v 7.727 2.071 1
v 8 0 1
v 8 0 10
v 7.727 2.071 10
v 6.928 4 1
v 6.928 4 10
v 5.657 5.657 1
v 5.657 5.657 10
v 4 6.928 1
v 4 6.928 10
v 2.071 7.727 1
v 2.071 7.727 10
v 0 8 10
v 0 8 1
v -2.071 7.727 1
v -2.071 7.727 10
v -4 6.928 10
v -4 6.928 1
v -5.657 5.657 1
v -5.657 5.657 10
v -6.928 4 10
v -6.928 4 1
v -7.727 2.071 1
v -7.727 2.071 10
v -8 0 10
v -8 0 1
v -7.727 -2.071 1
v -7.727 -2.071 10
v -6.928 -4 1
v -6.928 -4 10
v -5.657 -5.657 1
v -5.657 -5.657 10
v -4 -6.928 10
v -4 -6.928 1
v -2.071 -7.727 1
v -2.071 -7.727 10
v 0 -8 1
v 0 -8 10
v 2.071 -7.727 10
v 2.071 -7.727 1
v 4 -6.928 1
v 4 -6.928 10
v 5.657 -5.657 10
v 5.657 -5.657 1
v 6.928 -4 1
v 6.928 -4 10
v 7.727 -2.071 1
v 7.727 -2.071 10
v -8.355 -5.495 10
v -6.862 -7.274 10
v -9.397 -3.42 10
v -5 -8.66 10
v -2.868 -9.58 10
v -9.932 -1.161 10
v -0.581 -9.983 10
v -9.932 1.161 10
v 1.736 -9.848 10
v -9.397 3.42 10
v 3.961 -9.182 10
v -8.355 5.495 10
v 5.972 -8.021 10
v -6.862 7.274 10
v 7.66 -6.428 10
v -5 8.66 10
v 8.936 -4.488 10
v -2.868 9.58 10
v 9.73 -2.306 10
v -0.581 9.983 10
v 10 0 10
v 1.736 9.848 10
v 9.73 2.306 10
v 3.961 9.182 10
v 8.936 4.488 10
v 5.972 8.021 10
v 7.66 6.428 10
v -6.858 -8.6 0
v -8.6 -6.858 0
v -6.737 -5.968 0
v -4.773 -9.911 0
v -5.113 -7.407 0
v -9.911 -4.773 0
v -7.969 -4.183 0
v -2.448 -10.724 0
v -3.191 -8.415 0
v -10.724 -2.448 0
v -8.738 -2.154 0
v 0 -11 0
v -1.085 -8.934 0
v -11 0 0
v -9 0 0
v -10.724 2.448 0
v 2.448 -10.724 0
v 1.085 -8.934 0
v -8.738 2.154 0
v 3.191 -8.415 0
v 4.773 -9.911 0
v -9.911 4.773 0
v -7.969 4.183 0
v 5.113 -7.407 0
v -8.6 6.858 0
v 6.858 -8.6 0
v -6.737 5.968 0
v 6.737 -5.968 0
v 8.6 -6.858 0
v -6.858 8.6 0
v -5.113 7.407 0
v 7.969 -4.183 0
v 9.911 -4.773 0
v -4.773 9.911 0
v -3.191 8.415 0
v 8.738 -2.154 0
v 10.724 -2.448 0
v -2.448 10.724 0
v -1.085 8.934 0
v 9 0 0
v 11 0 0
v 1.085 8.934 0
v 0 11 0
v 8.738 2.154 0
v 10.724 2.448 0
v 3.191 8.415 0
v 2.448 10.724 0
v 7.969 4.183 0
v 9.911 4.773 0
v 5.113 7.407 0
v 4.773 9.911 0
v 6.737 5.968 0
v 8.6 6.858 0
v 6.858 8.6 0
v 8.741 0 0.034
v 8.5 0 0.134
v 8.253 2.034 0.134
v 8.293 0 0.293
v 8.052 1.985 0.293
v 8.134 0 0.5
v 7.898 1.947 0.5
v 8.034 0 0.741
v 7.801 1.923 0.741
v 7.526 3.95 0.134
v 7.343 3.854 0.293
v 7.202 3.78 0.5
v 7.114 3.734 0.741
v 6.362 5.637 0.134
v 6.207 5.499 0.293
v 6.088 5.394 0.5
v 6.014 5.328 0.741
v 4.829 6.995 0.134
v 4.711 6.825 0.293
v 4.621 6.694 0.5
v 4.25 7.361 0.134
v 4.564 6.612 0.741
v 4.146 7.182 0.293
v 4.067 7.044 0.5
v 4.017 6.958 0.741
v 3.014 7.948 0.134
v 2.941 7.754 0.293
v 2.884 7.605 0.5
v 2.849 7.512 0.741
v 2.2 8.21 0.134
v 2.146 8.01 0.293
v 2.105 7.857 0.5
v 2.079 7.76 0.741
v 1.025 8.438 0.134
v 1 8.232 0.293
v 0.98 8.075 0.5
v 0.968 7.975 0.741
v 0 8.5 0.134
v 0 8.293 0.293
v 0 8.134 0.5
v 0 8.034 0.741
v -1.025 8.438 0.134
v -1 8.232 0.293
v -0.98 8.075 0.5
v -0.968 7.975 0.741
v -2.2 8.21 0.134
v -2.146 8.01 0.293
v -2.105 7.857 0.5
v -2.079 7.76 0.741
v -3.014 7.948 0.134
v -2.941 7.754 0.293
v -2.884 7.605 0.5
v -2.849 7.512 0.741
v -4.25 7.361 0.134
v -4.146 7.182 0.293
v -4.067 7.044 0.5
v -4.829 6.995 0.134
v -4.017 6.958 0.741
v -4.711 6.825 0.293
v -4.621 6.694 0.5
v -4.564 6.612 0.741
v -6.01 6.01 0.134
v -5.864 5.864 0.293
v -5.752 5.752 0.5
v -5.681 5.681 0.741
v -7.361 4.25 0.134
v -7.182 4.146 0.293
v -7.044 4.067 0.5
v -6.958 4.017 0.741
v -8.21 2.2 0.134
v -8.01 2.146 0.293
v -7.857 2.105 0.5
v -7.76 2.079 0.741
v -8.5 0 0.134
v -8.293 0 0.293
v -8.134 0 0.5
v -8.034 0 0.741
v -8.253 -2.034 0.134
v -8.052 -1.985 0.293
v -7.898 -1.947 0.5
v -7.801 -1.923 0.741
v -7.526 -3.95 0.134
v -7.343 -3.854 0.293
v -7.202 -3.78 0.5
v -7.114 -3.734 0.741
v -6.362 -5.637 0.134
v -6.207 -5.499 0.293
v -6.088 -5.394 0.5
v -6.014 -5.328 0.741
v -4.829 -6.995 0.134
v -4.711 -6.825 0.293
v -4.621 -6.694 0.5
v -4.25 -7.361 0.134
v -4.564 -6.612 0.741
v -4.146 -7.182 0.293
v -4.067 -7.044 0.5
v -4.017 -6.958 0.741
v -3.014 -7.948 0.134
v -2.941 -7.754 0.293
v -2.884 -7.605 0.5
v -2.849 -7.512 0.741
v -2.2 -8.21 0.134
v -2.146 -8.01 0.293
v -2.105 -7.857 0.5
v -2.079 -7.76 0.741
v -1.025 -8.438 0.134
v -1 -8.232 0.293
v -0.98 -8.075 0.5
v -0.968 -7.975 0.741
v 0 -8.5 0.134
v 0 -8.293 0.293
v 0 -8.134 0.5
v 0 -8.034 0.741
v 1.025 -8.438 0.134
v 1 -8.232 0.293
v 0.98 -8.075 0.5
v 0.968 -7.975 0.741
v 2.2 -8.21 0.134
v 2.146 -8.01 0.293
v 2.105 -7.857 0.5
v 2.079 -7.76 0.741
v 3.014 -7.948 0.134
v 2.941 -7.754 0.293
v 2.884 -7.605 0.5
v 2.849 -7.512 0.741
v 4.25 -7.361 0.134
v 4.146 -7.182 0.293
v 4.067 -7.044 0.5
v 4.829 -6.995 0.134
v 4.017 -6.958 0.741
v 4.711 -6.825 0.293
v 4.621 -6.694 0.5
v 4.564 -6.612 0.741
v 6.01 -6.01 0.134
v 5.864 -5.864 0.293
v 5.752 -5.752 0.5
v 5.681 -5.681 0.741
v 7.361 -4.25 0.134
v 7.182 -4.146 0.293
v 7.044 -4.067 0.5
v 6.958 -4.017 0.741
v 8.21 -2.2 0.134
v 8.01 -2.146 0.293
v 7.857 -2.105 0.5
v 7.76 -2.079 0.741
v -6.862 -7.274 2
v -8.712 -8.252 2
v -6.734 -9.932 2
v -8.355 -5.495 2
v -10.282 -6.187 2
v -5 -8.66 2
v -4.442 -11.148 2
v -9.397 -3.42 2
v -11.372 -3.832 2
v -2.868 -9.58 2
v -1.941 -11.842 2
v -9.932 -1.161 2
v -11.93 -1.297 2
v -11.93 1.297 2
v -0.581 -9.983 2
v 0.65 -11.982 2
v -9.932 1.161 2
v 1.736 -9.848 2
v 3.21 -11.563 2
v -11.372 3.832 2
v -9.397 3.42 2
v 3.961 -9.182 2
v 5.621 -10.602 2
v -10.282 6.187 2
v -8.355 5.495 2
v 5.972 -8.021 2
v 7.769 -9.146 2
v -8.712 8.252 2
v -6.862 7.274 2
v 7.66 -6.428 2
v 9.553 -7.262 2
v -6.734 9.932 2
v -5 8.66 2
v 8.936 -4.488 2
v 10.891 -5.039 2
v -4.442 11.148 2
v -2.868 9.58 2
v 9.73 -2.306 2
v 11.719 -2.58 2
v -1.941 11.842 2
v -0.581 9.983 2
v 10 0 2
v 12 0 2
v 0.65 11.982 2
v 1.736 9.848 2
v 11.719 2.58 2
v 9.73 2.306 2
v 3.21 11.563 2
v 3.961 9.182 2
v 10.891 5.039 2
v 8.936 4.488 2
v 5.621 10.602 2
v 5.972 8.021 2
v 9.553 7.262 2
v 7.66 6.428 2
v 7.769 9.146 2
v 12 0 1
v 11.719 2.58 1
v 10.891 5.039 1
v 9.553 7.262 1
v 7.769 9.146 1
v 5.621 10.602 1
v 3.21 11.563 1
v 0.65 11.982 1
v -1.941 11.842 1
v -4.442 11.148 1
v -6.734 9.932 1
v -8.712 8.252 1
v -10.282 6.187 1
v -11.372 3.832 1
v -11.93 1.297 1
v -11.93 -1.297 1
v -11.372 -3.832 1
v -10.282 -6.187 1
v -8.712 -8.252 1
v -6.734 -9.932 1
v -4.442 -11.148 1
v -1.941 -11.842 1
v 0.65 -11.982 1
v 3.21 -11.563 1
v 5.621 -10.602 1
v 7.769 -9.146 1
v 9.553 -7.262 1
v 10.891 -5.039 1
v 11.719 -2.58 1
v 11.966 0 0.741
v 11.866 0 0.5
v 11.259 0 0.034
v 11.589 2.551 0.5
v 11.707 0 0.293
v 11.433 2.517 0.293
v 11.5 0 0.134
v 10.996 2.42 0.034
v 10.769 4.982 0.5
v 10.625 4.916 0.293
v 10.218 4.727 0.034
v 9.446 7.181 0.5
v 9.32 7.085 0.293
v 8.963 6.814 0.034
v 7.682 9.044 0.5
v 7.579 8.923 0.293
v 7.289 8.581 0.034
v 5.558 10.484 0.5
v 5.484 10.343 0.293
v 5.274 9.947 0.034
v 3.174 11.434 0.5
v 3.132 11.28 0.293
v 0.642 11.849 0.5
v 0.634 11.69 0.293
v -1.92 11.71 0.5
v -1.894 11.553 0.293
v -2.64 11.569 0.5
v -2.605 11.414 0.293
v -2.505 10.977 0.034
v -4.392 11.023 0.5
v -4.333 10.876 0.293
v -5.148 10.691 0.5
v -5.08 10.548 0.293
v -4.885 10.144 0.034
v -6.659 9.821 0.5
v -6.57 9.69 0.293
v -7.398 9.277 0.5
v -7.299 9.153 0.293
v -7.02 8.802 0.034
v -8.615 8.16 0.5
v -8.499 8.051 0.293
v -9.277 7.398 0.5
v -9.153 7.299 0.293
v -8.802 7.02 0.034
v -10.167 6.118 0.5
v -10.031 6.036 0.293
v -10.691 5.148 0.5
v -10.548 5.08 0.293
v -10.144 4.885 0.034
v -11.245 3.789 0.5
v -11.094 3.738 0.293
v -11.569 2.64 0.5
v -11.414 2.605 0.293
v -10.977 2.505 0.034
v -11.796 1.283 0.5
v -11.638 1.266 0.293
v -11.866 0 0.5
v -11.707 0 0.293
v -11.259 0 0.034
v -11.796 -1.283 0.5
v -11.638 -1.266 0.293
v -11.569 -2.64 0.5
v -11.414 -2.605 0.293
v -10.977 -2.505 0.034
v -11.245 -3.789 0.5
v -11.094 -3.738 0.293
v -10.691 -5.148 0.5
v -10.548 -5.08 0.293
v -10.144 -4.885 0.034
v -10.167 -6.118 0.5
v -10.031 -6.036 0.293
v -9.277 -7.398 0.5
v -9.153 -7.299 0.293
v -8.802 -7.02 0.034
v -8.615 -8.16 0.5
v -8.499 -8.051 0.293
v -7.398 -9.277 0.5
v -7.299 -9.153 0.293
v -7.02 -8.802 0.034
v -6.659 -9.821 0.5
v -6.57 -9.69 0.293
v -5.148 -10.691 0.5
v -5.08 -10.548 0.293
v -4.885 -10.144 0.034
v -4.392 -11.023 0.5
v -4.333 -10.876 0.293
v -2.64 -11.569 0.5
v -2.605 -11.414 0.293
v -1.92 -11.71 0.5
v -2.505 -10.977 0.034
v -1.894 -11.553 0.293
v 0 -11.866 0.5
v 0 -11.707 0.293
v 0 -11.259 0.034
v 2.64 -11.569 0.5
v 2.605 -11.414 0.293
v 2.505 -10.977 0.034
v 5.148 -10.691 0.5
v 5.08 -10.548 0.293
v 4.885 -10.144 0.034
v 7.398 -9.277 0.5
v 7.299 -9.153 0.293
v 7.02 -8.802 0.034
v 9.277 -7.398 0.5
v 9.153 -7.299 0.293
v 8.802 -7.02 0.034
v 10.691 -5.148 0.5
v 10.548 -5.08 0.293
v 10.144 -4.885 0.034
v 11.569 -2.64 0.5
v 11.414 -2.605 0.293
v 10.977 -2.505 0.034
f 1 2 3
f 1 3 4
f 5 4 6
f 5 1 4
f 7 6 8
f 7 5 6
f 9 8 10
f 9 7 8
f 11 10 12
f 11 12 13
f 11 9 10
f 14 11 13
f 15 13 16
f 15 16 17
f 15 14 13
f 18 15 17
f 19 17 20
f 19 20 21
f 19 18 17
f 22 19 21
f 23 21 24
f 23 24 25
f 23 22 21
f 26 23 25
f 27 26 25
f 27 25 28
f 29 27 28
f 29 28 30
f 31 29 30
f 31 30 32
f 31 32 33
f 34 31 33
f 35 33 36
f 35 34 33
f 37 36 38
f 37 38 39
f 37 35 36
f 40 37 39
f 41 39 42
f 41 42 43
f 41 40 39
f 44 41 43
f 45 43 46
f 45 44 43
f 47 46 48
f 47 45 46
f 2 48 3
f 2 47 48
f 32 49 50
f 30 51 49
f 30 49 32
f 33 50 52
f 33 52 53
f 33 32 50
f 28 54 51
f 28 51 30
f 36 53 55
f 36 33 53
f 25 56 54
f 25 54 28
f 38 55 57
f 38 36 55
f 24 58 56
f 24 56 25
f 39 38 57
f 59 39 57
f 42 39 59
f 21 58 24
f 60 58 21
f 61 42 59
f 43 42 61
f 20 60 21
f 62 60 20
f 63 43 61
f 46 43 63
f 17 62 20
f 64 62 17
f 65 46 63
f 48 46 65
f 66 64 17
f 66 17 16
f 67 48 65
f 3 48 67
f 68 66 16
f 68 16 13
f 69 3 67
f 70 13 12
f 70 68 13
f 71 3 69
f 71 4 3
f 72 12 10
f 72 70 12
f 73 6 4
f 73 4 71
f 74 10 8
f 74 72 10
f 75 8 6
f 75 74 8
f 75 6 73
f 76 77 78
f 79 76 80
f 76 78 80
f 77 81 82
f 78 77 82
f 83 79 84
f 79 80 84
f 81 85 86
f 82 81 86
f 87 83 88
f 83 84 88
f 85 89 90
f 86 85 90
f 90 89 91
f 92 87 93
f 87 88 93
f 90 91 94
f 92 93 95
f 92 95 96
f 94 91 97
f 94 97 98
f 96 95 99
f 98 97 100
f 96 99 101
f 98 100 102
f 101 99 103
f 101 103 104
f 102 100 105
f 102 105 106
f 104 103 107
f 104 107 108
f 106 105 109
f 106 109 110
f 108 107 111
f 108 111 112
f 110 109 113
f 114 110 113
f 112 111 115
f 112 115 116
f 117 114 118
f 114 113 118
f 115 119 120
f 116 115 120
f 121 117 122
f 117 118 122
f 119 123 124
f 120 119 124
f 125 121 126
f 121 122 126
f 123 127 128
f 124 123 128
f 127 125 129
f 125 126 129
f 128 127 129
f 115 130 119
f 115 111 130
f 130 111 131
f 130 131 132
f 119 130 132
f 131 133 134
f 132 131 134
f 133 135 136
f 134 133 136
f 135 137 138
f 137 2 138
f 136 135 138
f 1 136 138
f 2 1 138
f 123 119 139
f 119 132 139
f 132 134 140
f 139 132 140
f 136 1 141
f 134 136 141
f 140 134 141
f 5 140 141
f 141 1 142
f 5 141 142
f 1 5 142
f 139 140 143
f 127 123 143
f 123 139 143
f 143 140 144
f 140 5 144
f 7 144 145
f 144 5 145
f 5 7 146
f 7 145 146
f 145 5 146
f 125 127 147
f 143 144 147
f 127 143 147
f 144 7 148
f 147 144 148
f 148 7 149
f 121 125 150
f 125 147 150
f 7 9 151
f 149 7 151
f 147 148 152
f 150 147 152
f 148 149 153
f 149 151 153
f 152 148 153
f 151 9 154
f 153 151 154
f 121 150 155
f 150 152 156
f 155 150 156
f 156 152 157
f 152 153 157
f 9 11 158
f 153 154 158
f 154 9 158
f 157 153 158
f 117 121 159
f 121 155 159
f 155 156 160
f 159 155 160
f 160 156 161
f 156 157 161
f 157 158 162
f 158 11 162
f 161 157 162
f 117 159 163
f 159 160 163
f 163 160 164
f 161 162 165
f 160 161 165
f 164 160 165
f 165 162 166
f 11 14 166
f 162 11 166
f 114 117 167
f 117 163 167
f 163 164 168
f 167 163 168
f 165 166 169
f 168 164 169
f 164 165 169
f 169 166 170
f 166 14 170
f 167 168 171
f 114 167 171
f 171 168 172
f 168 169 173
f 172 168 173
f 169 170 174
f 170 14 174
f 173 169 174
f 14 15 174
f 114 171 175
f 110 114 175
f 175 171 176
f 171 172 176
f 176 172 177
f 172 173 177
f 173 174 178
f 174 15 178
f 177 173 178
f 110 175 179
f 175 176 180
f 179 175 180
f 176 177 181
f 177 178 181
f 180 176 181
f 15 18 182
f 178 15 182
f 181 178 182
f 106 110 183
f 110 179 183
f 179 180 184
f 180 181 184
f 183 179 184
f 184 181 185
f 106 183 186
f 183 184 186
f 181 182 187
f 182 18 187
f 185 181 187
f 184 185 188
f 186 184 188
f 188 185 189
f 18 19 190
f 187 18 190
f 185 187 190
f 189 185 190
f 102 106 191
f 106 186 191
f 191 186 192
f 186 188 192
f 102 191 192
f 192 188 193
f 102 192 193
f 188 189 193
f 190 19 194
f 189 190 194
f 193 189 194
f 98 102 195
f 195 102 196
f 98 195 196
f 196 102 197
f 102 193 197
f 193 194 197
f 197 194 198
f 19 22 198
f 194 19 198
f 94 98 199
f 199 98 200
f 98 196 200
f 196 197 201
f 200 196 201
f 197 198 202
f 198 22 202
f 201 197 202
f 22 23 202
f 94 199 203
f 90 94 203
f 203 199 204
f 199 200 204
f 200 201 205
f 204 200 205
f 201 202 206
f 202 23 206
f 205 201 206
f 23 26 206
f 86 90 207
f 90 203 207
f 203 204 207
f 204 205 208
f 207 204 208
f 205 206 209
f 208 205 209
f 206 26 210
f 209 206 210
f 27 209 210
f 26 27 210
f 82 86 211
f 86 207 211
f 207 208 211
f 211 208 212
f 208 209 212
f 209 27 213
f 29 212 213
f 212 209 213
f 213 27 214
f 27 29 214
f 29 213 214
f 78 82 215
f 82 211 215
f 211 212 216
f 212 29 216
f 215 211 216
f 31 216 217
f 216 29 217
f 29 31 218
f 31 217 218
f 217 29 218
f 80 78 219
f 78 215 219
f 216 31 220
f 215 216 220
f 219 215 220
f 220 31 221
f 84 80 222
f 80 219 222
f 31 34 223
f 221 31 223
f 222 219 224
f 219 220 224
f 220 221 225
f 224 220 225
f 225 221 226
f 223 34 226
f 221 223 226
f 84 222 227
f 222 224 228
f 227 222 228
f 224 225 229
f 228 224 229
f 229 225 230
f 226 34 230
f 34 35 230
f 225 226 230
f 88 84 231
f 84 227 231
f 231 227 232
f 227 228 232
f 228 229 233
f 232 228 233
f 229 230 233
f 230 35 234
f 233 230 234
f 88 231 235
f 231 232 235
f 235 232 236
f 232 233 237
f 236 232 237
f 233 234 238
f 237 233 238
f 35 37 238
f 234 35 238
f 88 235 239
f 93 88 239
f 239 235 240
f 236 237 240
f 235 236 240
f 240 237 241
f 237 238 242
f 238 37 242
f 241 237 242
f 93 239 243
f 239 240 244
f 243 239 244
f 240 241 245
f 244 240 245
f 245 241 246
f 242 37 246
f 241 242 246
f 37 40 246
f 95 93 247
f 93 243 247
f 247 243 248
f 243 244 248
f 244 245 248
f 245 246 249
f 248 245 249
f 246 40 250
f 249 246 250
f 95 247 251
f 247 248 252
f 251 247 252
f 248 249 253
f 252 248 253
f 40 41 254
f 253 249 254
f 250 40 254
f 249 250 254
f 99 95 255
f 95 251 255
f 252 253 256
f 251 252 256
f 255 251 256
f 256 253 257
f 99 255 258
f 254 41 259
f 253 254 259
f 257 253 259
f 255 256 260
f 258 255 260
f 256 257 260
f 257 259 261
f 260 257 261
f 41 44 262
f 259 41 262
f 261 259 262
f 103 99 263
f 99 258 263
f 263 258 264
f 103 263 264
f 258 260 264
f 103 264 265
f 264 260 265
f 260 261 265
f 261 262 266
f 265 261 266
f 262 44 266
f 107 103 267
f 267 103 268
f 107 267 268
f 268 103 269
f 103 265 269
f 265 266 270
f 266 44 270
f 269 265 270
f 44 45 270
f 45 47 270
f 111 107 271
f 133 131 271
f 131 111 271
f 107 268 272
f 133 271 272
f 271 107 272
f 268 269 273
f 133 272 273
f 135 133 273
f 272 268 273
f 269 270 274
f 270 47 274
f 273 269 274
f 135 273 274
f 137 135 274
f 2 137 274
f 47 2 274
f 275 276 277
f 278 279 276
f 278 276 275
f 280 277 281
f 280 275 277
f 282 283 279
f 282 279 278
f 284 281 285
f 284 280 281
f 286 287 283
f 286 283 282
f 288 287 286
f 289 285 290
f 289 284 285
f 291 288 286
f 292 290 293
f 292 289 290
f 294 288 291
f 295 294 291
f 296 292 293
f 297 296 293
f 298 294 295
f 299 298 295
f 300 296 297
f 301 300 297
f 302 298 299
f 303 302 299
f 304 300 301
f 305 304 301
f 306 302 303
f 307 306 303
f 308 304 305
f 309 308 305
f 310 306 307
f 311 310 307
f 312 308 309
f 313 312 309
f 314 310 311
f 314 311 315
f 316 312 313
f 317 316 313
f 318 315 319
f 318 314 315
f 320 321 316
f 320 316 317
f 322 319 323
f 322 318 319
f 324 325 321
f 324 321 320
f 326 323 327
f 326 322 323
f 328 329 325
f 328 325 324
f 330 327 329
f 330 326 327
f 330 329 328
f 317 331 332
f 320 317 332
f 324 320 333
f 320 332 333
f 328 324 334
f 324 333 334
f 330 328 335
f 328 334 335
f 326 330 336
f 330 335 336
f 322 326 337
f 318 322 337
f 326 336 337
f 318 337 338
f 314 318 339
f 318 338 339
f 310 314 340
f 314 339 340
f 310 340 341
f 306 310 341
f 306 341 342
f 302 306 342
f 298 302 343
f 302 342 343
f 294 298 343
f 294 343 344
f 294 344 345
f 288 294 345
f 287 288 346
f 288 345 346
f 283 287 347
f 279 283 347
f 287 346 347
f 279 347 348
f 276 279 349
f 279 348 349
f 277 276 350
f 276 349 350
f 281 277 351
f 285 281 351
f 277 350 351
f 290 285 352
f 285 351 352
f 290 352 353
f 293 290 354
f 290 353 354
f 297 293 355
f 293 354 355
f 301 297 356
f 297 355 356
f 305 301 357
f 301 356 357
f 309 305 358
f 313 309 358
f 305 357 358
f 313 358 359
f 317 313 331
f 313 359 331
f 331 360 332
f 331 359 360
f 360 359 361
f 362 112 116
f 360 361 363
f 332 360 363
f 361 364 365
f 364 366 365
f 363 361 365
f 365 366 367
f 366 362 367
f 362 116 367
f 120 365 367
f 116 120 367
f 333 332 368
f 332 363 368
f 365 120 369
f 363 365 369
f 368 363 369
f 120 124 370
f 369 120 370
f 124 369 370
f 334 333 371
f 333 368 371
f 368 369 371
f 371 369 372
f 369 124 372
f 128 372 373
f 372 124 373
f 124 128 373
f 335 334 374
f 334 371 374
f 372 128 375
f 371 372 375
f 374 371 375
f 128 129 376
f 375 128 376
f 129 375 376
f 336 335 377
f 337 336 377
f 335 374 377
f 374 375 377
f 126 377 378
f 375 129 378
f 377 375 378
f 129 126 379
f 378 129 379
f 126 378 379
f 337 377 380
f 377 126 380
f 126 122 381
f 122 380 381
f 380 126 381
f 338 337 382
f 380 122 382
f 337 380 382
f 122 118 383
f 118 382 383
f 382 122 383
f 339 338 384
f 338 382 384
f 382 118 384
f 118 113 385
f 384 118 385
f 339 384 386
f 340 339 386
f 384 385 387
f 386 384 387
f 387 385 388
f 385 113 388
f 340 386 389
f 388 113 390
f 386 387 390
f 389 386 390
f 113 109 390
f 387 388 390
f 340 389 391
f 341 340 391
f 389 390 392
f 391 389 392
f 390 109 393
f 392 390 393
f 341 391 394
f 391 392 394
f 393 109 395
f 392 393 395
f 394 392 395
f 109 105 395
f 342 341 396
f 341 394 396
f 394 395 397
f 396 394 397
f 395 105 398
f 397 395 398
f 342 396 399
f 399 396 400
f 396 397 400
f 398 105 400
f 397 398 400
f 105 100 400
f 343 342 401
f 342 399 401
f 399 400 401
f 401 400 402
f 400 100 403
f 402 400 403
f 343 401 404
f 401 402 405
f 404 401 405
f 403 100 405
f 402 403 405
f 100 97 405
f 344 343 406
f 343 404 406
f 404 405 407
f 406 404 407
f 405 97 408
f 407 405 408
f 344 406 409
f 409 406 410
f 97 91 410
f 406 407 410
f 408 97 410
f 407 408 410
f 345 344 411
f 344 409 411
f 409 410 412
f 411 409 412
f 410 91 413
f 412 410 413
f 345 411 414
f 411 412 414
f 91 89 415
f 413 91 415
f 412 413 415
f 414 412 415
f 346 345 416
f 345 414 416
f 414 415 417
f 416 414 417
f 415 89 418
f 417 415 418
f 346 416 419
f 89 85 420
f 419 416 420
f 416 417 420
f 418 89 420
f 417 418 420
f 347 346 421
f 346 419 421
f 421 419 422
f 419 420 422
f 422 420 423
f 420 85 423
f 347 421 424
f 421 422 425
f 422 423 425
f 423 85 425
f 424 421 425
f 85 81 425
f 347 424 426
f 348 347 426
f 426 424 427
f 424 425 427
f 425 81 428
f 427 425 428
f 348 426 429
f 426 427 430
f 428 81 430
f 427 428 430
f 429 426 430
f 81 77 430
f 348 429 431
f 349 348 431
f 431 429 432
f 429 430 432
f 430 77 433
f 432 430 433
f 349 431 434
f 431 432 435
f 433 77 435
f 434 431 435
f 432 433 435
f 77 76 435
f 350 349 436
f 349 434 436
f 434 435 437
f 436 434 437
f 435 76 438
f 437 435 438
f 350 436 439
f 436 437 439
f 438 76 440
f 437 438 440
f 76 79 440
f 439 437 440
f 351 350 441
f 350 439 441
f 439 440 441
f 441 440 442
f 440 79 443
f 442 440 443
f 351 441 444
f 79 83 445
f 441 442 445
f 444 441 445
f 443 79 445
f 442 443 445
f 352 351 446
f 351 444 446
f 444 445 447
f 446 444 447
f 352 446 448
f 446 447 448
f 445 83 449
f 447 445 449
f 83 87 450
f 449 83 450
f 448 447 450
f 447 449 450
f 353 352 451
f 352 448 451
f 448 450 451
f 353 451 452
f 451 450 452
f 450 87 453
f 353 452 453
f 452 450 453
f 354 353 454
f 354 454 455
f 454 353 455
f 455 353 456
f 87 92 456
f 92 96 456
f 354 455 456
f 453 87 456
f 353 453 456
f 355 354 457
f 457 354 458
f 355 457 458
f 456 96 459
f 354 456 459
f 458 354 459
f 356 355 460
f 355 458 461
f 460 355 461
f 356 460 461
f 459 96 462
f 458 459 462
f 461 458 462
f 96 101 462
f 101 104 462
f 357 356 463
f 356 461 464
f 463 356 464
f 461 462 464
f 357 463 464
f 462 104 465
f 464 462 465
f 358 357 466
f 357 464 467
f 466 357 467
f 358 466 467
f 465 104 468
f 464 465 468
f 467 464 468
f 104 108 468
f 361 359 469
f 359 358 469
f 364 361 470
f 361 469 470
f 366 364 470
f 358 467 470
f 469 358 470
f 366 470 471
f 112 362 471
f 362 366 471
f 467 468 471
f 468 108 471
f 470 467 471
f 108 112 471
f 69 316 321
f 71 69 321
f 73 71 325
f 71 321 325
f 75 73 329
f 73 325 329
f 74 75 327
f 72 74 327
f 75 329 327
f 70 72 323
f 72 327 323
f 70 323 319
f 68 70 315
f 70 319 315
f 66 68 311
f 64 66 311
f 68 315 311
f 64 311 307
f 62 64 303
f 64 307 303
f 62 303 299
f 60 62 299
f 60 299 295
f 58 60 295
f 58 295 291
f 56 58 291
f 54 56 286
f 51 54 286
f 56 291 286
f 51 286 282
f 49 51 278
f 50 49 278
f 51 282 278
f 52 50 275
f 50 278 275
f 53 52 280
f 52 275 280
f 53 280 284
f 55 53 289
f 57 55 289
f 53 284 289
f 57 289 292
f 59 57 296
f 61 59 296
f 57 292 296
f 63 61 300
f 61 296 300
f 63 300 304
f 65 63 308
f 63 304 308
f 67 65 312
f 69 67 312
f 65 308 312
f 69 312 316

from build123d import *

# Parameters (mm, degrees)
CYLINDER_R        = 8
CYLINDER_DEPTH    = 10
CYLINDER001_R     = 12
CYLINDER001_DEPTH = 2
CYLINDER002_R     = 10
CYLINDER002_DEPTH = 8
FILLET_R          = 1


with BuildPart() as cylinder:
    # Cylinder → Cylinder (new body)
    with BuildSketch(Plane.XY):
        Circle(CYLINDER_R)
    extrude(amount=CYLINDER_DEPTH)


with BuildPart() as cylinder001:
    # Cylinder001 → Cylinder001 (new body)
    with BuildSketch(Plane.XY):
        Circle(CYLINDER001_R)
    extrude(amount=CYLINDER001_DEPTH)


with BuildPart() as fillet_body:
    # Cylinder002 → Cylinder002 (new body)
    with BuildSketch(Plane.XY.offset(2)):
        Circle(CYLINDER002_R)
    extrude(amount=CYLINDER002_DEPTH)

    # Fusion: union Cylinder001
    add(cylinder001.part)

    # Cut: cut Cylinder
    add(cylinder.part, mode=Mode.SUBTRACT)

    # Fillet
    fillet_edges = [fillet_body.edges().sort_by_distance(p)[0] for p in [
        (-12, 0, 0),
        (-8, 0, 0),
    ]]
    fillet(fillet_edges, radius=FILLET_R)


solid = fillet_body.part
